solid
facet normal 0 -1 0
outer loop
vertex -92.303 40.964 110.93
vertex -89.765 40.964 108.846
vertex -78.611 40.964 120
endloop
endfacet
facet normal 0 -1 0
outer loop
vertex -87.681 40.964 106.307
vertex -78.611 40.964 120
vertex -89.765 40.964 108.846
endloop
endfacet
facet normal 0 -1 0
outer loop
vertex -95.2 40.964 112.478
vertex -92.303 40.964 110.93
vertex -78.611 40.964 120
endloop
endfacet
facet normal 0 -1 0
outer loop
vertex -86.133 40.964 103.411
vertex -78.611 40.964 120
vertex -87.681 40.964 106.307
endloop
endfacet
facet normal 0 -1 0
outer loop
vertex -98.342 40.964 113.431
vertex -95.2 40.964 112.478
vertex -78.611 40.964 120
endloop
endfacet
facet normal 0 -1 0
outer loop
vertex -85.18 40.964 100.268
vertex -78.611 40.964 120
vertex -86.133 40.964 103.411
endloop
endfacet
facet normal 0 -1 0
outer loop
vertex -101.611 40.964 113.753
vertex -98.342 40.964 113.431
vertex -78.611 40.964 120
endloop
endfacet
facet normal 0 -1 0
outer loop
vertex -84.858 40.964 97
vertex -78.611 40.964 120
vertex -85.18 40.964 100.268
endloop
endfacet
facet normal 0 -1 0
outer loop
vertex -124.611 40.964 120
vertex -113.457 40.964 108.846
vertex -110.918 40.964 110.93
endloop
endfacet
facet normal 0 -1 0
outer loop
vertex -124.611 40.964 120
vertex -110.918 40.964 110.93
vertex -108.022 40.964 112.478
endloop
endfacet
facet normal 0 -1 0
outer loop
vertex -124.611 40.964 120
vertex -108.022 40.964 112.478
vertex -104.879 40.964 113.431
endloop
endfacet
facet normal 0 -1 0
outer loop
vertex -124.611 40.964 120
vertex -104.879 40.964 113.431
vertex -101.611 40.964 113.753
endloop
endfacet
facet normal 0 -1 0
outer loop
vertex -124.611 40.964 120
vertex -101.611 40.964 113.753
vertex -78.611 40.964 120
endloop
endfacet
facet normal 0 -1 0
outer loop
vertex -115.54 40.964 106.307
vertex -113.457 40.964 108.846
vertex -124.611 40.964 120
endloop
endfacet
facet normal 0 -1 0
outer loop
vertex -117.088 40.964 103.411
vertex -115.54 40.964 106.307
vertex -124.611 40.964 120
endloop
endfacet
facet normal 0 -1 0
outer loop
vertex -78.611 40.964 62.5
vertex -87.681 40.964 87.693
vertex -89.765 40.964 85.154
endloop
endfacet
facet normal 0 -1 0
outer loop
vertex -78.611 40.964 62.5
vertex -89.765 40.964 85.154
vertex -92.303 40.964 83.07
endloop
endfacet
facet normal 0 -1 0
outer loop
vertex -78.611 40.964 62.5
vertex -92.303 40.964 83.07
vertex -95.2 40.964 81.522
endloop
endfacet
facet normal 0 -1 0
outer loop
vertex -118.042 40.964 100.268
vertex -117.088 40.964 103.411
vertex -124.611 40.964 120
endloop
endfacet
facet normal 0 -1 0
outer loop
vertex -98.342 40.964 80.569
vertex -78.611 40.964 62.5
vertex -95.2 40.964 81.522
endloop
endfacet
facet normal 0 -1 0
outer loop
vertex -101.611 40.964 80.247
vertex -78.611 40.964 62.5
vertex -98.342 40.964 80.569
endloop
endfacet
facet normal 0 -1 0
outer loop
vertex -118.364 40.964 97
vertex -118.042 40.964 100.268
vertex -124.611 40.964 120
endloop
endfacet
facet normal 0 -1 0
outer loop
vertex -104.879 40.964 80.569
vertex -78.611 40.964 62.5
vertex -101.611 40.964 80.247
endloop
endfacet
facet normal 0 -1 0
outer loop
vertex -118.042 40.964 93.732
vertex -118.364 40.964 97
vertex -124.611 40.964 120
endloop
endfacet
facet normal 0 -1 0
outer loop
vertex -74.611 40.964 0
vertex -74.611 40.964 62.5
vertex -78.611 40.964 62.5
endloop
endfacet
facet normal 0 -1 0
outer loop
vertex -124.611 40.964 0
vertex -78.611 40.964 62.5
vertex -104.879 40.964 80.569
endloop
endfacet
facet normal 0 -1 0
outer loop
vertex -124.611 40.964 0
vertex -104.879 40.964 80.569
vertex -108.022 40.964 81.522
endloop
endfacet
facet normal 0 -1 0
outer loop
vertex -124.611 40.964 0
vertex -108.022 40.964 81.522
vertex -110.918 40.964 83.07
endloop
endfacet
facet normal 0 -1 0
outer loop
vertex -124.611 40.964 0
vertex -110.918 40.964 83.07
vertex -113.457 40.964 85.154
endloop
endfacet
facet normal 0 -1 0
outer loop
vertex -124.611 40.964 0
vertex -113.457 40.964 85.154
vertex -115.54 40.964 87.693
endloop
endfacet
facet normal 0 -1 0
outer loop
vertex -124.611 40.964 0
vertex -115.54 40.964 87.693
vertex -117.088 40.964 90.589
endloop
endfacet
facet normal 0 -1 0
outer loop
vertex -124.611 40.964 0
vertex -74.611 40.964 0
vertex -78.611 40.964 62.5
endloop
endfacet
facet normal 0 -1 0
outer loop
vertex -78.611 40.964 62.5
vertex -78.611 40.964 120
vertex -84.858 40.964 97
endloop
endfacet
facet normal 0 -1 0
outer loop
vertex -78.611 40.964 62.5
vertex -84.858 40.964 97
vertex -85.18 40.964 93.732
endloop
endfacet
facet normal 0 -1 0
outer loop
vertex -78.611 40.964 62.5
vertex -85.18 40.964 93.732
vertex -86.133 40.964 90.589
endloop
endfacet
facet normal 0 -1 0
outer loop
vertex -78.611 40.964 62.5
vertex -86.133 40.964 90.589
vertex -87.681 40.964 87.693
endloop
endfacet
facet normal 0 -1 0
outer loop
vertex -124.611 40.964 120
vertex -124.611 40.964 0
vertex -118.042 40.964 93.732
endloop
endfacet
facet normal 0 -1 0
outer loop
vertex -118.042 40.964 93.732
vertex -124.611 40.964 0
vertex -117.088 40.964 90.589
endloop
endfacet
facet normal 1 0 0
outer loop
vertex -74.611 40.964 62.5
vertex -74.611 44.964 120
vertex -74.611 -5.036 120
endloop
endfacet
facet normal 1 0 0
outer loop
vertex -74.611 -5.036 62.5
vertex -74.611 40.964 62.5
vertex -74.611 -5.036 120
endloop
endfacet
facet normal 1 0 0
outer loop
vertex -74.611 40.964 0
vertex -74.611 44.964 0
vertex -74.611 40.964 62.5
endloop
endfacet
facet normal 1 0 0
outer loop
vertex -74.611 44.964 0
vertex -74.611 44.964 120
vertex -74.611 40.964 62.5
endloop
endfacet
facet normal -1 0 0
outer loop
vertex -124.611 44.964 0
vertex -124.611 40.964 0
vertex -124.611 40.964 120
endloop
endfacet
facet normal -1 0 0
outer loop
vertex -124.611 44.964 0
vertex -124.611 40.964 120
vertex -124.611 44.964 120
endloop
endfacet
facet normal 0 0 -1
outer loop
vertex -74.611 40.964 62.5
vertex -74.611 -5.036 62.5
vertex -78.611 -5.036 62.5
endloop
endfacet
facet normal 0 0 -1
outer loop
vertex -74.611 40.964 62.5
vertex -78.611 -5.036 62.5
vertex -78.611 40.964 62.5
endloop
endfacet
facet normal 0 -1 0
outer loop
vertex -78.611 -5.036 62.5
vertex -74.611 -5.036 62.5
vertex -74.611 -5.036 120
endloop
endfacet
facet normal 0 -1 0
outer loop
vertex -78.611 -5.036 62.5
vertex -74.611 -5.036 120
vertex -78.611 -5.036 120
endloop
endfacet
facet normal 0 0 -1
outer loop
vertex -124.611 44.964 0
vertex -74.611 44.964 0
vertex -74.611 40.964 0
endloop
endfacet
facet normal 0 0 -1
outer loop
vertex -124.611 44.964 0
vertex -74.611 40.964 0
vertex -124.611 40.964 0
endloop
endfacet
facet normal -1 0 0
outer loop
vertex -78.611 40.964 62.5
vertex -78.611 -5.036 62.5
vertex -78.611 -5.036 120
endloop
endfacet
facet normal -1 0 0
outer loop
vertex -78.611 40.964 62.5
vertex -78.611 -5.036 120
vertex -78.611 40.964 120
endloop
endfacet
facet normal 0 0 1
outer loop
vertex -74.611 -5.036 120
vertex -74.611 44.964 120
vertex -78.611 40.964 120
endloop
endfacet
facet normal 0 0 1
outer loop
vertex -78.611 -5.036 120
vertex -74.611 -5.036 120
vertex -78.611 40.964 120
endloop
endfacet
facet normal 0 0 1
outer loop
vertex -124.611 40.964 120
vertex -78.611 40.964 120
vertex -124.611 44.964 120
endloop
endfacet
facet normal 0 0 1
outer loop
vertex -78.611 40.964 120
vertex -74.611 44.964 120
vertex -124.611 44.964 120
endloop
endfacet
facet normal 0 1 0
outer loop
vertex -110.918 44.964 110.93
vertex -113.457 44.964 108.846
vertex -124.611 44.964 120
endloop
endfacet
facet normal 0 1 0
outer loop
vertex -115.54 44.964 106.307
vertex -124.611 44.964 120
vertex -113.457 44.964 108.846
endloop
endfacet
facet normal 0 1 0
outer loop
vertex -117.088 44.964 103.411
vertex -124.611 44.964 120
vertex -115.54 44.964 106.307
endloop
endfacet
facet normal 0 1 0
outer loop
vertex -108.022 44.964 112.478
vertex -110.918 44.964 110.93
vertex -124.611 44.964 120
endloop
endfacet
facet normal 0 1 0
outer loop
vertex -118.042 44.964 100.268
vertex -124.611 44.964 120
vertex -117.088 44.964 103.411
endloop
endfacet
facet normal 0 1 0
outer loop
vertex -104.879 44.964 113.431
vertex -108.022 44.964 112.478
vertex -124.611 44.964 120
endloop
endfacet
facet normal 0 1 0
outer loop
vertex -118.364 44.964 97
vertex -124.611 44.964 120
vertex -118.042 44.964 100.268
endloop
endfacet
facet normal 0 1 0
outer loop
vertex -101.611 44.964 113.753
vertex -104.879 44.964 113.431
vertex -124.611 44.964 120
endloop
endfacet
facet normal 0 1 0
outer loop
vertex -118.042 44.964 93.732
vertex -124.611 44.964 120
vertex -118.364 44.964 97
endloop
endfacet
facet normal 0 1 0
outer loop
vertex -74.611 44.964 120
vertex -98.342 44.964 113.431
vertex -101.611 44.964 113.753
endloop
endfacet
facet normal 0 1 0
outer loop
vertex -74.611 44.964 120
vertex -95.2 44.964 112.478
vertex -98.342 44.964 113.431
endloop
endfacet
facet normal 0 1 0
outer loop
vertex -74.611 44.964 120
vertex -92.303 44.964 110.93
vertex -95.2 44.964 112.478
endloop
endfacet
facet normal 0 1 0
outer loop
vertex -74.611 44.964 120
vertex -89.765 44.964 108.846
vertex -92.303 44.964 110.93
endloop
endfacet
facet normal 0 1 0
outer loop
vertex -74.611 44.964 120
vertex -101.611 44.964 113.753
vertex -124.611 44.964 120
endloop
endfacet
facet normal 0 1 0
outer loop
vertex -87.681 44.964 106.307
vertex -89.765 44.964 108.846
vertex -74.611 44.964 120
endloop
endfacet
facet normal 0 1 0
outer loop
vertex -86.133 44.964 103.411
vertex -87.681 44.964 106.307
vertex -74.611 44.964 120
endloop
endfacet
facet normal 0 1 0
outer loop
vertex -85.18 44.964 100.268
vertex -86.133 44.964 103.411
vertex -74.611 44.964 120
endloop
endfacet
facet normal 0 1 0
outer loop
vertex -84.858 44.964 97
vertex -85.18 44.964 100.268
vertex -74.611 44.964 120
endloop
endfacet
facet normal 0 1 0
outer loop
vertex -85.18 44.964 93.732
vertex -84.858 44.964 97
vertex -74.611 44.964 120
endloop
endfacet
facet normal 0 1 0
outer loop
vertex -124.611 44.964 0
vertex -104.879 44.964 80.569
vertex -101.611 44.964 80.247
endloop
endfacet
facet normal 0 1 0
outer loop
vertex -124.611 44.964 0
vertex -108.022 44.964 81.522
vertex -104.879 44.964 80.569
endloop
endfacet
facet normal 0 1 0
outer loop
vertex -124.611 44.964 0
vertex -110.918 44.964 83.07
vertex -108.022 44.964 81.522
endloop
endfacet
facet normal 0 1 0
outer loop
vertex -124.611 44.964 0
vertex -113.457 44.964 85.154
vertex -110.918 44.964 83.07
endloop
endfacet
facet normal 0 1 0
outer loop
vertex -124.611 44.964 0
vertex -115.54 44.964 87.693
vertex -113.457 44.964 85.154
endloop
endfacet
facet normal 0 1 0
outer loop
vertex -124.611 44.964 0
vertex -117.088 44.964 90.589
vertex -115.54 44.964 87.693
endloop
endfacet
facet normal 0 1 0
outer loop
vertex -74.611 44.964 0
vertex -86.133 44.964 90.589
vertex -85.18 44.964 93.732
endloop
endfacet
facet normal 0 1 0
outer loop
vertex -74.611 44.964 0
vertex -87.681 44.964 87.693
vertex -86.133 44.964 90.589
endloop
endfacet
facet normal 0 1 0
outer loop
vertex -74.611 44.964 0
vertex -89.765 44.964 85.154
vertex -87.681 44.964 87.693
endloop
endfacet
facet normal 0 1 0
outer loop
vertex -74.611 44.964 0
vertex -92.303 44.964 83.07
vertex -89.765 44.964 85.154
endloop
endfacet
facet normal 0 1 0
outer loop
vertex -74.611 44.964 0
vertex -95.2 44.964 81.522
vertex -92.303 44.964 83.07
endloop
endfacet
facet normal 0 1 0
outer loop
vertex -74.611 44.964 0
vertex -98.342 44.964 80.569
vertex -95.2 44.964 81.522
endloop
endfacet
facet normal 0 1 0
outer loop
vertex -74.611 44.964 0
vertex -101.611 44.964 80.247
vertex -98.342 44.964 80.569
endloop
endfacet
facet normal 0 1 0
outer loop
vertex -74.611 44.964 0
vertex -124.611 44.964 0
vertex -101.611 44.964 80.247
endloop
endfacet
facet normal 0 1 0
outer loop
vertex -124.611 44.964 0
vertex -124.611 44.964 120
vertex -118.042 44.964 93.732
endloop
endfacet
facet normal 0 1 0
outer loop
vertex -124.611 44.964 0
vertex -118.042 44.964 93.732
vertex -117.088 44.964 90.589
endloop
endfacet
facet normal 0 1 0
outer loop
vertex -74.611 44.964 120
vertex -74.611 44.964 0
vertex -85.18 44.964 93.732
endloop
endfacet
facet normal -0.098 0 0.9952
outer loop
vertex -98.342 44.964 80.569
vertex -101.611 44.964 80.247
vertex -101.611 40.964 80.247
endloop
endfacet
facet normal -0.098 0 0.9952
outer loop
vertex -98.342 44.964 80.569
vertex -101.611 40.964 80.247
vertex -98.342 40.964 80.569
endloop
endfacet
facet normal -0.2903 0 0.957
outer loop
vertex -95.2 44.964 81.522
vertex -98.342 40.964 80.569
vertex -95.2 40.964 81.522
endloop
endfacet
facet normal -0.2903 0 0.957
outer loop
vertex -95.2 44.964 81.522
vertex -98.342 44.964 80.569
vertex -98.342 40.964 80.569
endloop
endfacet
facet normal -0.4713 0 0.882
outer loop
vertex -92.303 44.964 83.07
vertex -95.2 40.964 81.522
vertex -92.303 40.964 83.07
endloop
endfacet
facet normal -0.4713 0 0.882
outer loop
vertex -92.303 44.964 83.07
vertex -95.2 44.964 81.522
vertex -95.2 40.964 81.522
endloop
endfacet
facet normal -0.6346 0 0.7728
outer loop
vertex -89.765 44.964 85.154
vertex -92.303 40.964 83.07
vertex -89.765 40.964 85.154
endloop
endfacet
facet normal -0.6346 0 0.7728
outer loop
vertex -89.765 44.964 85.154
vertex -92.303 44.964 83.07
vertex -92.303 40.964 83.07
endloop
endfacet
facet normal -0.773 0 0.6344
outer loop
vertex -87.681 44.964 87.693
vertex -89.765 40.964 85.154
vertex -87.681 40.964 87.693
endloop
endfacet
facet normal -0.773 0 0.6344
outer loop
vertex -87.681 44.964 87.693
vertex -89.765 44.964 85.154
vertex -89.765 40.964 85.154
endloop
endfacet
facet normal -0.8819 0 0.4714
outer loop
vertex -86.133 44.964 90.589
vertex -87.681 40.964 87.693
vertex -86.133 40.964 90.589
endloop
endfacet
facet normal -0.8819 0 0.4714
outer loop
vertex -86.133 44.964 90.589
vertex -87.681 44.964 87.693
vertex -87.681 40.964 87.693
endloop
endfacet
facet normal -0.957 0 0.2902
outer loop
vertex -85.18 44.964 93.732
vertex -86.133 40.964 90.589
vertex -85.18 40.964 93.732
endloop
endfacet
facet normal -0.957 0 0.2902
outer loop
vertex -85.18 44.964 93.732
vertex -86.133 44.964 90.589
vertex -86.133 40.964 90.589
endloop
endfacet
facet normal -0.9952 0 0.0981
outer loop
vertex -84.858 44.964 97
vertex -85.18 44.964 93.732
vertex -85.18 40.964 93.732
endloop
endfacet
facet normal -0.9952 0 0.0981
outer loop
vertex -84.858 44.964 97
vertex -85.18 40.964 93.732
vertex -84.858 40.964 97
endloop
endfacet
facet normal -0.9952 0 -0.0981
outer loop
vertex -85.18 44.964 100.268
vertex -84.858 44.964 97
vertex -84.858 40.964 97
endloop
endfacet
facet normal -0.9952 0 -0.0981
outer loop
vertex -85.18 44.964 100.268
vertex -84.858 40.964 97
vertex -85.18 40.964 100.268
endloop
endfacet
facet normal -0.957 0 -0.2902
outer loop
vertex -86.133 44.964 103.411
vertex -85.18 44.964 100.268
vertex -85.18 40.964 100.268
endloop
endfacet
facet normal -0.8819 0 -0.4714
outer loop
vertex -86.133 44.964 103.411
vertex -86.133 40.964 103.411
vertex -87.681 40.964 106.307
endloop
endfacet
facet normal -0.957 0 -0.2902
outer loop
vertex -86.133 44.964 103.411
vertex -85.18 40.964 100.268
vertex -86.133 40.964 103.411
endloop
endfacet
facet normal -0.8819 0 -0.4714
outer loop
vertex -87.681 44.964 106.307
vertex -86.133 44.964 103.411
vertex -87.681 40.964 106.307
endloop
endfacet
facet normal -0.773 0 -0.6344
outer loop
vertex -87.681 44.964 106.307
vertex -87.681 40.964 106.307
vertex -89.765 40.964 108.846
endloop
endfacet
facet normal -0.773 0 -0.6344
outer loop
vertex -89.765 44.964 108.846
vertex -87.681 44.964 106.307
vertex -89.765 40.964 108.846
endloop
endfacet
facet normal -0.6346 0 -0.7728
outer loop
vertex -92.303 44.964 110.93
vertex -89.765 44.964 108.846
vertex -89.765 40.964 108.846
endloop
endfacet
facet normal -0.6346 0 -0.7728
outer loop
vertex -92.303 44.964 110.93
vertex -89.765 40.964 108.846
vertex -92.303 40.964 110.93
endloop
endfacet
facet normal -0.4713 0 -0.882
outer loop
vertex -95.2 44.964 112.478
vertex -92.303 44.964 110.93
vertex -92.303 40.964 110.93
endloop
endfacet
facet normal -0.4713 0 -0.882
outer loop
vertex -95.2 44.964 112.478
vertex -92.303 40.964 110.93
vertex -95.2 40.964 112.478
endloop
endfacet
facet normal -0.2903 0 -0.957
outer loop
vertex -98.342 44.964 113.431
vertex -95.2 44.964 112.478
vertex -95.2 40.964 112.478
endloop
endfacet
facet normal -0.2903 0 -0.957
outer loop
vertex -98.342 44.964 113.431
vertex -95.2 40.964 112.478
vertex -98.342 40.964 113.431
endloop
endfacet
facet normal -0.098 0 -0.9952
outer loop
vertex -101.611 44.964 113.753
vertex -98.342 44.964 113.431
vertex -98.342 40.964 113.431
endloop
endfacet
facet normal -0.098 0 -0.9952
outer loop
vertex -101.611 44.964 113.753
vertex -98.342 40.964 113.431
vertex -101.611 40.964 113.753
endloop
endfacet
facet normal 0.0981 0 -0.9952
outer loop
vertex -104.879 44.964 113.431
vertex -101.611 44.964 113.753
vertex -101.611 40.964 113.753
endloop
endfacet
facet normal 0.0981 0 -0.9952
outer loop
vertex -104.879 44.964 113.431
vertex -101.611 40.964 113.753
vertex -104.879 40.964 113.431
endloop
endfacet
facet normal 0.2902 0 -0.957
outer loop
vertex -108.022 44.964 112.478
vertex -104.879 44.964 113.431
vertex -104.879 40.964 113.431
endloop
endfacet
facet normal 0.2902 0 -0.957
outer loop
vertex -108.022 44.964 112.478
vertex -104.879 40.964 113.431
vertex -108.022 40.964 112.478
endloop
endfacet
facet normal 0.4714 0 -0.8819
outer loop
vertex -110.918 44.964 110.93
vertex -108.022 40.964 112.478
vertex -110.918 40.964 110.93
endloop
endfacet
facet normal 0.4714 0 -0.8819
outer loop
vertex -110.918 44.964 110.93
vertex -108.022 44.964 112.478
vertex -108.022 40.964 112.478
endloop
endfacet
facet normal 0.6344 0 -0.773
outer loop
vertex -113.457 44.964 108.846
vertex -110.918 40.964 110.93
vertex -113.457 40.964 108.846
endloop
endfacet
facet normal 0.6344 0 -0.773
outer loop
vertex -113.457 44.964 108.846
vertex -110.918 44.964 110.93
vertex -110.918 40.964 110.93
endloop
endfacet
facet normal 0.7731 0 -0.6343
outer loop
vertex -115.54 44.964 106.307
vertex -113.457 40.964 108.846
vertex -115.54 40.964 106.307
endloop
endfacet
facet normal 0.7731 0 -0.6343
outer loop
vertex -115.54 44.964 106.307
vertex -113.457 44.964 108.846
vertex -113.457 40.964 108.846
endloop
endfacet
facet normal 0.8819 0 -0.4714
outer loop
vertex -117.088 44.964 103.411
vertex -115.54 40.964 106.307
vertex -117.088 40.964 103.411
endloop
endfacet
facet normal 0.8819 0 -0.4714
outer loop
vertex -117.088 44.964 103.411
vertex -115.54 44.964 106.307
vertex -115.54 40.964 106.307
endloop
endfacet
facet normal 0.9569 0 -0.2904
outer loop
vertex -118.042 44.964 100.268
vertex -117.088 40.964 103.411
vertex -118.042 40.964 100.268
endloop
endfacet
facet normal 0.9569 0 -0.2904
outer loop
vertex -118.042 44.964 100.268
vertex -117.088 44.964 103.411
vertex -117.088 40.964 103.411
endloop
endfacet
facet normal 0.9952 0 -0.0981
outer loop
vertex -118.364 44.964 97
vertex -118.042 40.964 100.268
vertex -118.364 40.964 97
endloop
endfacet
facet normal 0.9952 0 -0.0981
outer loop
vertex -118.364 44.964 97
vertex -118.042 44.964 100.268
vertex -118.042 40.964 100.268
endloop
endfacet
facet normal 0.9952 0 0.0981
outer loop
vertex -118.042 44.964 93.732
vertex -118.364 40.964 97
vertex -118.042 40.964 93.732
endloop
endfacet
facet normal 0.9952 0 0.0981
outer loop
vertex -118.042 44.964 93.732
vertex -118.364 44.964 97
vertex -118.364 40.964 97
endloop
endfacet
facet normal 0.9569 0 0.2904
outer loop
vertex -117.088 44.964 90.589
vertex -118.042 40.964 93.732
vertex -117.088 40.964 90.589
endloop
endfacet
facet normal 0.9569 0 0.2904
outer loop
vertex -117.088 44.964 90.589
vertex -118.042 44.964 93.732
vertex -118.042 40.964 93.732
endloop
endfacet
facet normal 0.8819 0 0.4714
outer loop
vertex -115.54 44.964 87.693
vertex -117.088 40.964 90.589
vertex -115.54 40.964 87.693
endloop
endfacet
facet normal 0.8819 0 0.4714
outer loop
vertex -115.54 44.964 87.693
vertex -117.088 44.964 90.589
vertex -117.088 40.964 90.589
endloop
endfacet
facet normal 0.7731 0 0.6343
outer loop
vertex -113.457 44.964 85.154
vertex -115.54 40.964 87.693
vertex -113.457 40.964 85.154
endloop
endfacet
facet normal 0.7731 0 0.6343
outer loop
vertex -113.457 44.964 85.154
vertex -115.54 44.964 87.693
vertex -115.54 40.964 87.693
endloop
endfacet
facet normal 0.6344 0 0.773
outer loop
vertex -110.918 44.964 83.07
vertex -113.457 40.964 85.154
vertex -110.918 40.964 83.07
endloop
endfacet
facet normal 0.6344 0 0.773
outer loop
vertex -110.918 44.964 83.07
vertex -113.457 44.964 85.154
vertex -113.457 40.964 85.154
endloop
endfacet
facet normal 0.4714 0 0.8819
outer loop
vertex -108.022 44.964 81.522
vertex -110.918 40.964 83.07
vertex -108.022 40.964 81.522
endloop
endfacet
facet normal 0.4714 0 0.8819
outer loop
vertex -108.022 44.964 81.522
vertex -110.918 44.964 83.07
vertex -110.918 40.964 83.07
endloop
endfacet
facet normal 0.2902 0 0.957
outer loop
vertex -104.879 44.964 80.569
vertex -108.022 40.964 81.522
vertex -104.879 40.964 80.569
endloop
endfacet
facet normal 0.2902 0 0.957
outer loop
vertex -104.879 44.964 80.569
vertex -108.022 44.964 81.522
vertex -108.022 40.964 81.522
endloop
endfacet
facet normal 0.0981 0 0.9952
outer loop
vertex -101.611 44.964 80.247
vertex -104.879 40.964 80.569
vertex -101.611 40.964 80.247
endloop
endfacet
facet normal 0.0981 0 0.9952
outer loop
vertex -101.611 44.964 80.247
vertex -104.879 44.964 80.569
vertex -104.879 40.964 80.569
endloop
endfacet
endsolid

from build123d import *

# Parameters (mm, degrees)
SALIENTE_EXTRUIR1_DEPTH     = 120
CORTAR_EXTRUIR4_DEPTH       = 118
CORTAR_EXTRUIR4_DEPTH_BACK  = 26
CROQUIS2_W                  = 62.5
CROQUIS2_H                  = 46
CORTAR_EXTRUIR10_DEPTH      = 30
CORTAR_EXTRUIR10_DEPTH_BACK = 41
CROQUIS3_R                  = 16.752869439


with BuildPart() as part:
    # Croquis1 → Saliente-Extruir1 (new body)
    with BuildSketch(Plane.XY):
        Polygon((-124.610735746, 44.963996627), (-74.610735746, 44.963996627), (-74.610735746, -5.036003373), (-78.610735746, -5.036003373), (-78.610735746, 40.963996627), (-124.610735746, 40.963996627), align=None)
    extrude(amount=SALIENTE_EXTRUIR1_DEPTH)

    # Croquis2 → Cortar-Extruir4 (cut, two sides: drawn at the far end of the back side and taken through both)
    with BuildSketch(Plane.ZY.offset(78.610735746).offset(-CORTAR_EXTRUIR4_DEPTH_BACK)):
        with Locations((31.25, 17.963996627)):
            Rectangle(CROQUIS2_W, CROQUIS2_H)
    extrude(amount=CORTAR_EXTRUIR4_DEPTH + CORTAR_EXTRUIR4_DEPTH_BACK, mode=Mode.SUBTRACT)

    # Croquis3 → Cortar-Extruir10 (cut, two sides: drawn at the far end of the back side and taken through both)
    with BuildSketch(Plane.XZ.offset(-40.963996627).offset(-CORTAR_EXTRUIR10_DEPTH_BACK)):
        with Locations(Location((-101.610735746, 97, 0), (0, 0, 270))):
            Circle(CROQUIS3_R)
    extrude(amount=CORTAR_EXTRUIR10_DEPTH + CORTAR_EXTRUIR10_DEPTH_BACK, mode=Mode.SUBTRACT)


solid = part.part
